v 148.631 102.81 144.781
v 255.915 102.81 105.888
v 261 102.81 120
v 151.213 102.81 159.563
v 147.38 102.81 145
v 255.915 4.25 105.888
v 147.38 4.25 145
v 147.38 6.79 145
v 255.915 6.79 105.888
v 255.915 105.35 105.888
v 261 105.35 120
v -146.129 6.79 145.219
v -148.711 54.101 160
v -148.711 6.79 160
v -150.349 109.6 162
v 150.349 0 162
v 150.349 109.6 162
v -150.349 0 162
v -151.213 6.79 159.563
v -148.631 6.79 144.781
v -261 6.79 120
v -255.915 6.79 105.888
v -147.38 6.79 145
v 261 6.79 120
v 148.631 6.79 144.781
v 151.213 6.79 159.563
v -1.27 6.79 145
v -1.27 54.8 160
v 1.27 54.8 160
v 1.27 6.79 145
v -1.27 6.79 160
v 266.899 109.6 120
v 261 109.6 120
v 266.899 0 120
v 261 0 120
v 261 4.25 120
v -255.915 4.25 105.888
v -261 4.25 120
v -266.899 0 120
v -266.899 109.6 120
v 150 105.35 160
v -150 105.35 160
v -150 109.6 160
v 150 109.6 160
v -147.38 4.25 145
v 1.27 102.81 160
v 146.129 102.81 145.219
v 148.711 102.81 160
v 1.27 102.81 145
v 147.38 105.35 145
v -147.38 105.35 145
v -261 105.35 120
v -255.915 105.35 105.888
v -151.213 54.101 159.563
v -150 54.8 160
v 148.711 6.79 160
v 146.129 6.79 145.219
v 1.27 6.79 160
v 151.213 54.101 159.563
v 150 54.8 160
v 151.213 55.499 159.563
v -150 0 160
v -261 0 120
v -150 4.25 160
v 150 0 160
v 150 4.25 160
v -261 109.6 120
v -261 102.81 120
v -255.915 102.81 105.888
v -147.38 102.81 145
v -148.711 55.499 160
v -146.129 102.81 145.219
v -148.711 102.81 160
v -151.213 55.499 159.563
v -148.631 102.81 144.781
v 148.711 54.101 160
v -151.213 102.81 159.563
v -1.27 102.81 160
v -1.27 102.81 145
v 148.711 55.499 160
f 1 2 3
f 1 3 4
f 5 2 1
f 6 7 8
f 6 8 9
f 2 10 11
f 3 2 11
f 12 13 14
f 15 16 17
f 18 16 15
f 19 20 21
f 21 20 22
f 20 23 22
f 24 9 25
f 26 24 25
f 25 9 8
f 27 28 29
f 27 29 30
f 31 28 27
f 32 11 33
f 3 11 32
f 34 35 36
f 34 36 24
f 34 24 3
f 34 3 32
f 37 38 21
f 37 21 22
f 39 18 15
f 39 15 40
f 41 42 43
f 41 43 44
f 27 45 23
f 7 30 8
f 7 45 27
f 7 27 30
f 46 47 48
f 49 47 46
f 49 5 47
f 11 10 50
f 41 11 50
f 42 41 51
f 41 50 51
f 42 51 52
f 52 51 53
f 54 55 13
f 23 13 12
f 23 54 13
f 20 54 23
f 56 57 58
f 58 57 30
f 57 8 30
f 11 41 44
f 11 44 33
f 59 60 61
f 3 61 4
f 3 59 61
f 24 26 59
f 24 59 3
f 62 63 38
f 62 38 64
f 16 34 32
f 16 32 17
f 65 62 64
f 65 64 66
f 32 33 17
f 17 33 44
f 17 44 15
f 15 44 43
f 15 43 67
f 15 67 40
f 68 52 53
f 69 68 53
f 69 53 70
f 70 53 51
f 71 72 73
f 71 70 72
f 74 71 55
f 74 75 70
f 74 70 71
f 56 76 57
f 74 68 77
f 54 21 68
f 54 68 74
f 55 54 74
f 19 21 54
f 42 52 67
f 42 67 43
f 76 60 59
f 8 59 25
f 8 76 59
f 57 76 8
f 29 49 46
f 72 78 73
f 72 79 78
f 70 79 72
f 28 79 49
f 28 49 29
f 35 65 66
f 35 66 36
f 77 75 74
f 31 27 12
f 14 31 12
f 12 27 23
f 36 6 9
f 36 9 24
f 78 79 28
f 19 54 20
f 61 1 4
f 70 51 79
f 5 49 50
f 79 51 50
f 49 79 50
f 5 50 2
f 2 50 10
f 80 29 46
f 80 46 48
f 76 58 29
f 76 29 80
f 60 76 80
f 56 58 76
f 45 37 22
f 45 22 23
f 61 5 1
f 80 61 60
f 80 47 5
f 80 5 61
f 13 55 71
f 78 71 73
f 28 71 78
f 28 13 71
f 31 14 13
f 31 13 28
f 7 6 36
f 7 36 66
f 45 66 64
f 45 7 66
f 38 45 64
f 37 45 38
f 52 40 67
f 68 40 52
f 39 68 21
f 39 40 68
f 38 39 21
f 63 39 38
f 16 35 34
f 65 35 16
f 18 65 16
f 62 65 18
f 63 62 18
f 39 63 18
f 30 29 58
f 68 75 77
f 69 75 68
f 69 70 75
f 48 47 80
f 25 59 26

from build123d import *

# Parameters (mm, degrees)
BOSS_EXTRUDE1_DEPTH = 109.600000002
BOSS_EXTRUDE2_DEPTH = 2.54
BOSS_EXTRUDE3_DEPTH = 2.54
RIB2_REACH          = 442.308
SKETCH5_WALL_W      = 932.98348183
SKETCH5_WALL_H      = 2.54
RIB3_REACH          = 442.308
SKETCH6_WALL_W      = 932.983481822
SKETCH6_WALL_H      = 2.54
RIB4_REACH          = 442.308
SKETCH7_WALL_W      = 932.98348183
SKETCH7_WALL_H      = 2.54
RIB5_REACH          = 442.308
SKETCH8_WALL_W      = 932.983481822
SKETCH8_WALL_H      = 2.54
RIB6_REACH          = 332.895
SKETCH13_WALL_W     = 714.088496324
SKETCH13_WALL_H     = 2.54
RIB7_REACH          = 332.895
SKETCH14_WALL_W     = 714.088496324
SKETCH14_WALL_H     = 2.54


with BuildPart() as part:
    # Sketch1 → Boss-Extrude1 (new body)
    with BuildSketch(Plane(origin=(0, 0, 0), x_dir=(1, 0, 0), z_dir=(0, 1, 0))):
        Polygon((-261, -120), (-150, -160), (150, -160), (261, -120), (266.899364373, -120), (150.349364373, -162), (-150.349364373, -162), (-266.899364373, -120), align=None)
    extrude(amount=BOSS_EXTRUDE1_DEPTH)

    # Sketch2 → Boss-Extrude2 (add)
    with BuildSketch(Plane(origin=(0, 4.249999882, 0), x_dir=(1, 0, 0), z_dir=(0, 1, 0))):
        Polygon((147.379767211, -145.000000028), (255.91470639, -105.888310234), (261, -120), (150, -160), (-150, -160), (-261, -120), (-255.91470639, -105.888310234), (-147.379767211, -145.000000028), align=None)
    extrude(amount=BOSS_EXTRUDE2_DEPTH)

    # Sketch4 → Boss-Extrude3 (add)
    with BuildSketch(Plane(origin=(0, 105.35000012, 0), x_dir=(1, 0, 0), z_dir=(0, 1, 0))):
        Polygon((-255.914706381, -105.888310207), (-147.379767206, -145), (147.379767206, -145), (255.914706381, -105.888310207), (261, -120), (150, -160), (-150, -160), (-261, -120), align=None)
    extrude(amount=-BOSS_EXTRUDE3_DEPTH)

    # Sketch5 wall → Rib2 (add, up to next)
    with BuildSketch(Plane(origin=(-148.689883603, 78.80500006, 152.5), x_dir=(-0.052022900314, -0.953205171679, 0.297814570709), z_dir=(0.164024260653, -0.302324164902, -0.938986763077)), mode=Mode.PRIVATE) as rib2_sk1:
        Rectangle(SKETCH5_WALL_W, SKETCH5_WALL_H)
    rib2_tool1 = extrude(rib2_sk1.sketch, amount=-RIB2_REACH, mode=Mode.PRIVATE) - part.part
    add(rib2_tool1.solids().sort_by_distance((-148.689883603, 78.80500006, 152.5))[0])

    # Sketch6 wall → Rib3 (add, up to next)
    with BuildSketch(Plane(origin=(-148.689883606, 30.794999942, 152.500000014), x_dir=(0.052022900223, -0.953205171842, -0.297814570204), z_dir=(0.164024260681, 0.302324164389, -0.938986763237)), mode=Mode.PRIVATE) as rib3_sk1:
        Rectangle(SKETCH6_WALL_W, SKETCH6_WALL_H)
    rib3_tool1 = extrude(rib3_sk1.sketch, amount=-RIB3_REACH, mode=Mode.PRIVATE) - part.part
    add(rib3_tool1.solids().sort_by_distance((-148.689883606, 30.794999942, 152.500000014))[0])

    # Sketch7 wall → Rib4 (add, up to next)
    with BuildSketch(Plane(origin=(148.689883603, 78.80500006, 152.5), x_dir=(0.052022900314, -0.953205171679, 0.297814570709), z_dir=(-0.164024260653, -0.302324164902, -0.938986763077)), mode=Mode.PRIVATE) as rib4_sk1:
        Rectangle(SKETCH7_WALL_W, SKETCH7_WALL_H)
    rib4_tool1 = extrude(rib4_sk1.sketch, amount=-RIB4_REACH, mode=Mode.PRIVATE) - part.part
    add(rib4_tool1.solids().sort_by_distance((148.689883603, 78.80500006, 152.5))[0])

    # Sketch8 wall → Rib5 (add, up to next)
    with BuildSketch(Plane(origin=(148.689883606, 30.794999942, 152.500000014), x_dir=(-0.052022900223, -0.953205171842, -0.297814570204), z_dir=(-0.164024260681, 0.302324164389, -0.938986763237)), mode=Mode.PRIVATE) as rib5_sk1:
        Rectangle(SKETCH8_WALL_W, SKETCH8_WALL_H)
    rib5_tool1 = extrude(rib5_sk1.sketch, amount=-RIB5_REACH, mode=Mode.PRIVATE) - part.part
    add(rib5_tool1.solids().sort_by_distance((148.689883606, 30.794999942, 152.500000014))[0])

    # Sketch13 wall → Rib6 (add, up to next)
    with BuildSketch(Plane(origin=(0, 78.80500006, 152.5), x_dir=(0, -0.954497664491, 0.298218390583), z_dir=(0, -0.298218390583, -0.954497664491)), mode=Mode.PRIVATE) as rib6_sk1:
        Rectangle(SKETCH13_WALL_W, SKETCH13_WALL_H)
    rib6_tool1 = extrude(rib6_sk1.sketch, amount=-RIB6_REACH, mode=Mode.PRIVATE) - part.part
    add(rib6_tool1.solids().sort_by_distance((0, 78.80500006, 152.5))[0])

    # Sketch14 wall → Rib7 (add, up to next)
    with BuildSketch(Plane(origin=(0, 30.794999942, 152.5), x_dir=(0, -0.954497664491, -0.298218390583), z_dir=(0, 0.298218390583, -0.954497664491)), mode=Mode.PRIVATE) as rib7_sk1:
        Rectangle(SKETCH14_WALL_W, SKETCH14_WALL_H)
    rib7_tool1 = extrude(rib7_sk1.sketch, amount=-RIB7_REACH, mode=Mode.PRIVATE) - part.part
    add(rib7_tool1.solids().sort_by_distance((0, 30.794999942, 152.5))[0])


solid = part.part
